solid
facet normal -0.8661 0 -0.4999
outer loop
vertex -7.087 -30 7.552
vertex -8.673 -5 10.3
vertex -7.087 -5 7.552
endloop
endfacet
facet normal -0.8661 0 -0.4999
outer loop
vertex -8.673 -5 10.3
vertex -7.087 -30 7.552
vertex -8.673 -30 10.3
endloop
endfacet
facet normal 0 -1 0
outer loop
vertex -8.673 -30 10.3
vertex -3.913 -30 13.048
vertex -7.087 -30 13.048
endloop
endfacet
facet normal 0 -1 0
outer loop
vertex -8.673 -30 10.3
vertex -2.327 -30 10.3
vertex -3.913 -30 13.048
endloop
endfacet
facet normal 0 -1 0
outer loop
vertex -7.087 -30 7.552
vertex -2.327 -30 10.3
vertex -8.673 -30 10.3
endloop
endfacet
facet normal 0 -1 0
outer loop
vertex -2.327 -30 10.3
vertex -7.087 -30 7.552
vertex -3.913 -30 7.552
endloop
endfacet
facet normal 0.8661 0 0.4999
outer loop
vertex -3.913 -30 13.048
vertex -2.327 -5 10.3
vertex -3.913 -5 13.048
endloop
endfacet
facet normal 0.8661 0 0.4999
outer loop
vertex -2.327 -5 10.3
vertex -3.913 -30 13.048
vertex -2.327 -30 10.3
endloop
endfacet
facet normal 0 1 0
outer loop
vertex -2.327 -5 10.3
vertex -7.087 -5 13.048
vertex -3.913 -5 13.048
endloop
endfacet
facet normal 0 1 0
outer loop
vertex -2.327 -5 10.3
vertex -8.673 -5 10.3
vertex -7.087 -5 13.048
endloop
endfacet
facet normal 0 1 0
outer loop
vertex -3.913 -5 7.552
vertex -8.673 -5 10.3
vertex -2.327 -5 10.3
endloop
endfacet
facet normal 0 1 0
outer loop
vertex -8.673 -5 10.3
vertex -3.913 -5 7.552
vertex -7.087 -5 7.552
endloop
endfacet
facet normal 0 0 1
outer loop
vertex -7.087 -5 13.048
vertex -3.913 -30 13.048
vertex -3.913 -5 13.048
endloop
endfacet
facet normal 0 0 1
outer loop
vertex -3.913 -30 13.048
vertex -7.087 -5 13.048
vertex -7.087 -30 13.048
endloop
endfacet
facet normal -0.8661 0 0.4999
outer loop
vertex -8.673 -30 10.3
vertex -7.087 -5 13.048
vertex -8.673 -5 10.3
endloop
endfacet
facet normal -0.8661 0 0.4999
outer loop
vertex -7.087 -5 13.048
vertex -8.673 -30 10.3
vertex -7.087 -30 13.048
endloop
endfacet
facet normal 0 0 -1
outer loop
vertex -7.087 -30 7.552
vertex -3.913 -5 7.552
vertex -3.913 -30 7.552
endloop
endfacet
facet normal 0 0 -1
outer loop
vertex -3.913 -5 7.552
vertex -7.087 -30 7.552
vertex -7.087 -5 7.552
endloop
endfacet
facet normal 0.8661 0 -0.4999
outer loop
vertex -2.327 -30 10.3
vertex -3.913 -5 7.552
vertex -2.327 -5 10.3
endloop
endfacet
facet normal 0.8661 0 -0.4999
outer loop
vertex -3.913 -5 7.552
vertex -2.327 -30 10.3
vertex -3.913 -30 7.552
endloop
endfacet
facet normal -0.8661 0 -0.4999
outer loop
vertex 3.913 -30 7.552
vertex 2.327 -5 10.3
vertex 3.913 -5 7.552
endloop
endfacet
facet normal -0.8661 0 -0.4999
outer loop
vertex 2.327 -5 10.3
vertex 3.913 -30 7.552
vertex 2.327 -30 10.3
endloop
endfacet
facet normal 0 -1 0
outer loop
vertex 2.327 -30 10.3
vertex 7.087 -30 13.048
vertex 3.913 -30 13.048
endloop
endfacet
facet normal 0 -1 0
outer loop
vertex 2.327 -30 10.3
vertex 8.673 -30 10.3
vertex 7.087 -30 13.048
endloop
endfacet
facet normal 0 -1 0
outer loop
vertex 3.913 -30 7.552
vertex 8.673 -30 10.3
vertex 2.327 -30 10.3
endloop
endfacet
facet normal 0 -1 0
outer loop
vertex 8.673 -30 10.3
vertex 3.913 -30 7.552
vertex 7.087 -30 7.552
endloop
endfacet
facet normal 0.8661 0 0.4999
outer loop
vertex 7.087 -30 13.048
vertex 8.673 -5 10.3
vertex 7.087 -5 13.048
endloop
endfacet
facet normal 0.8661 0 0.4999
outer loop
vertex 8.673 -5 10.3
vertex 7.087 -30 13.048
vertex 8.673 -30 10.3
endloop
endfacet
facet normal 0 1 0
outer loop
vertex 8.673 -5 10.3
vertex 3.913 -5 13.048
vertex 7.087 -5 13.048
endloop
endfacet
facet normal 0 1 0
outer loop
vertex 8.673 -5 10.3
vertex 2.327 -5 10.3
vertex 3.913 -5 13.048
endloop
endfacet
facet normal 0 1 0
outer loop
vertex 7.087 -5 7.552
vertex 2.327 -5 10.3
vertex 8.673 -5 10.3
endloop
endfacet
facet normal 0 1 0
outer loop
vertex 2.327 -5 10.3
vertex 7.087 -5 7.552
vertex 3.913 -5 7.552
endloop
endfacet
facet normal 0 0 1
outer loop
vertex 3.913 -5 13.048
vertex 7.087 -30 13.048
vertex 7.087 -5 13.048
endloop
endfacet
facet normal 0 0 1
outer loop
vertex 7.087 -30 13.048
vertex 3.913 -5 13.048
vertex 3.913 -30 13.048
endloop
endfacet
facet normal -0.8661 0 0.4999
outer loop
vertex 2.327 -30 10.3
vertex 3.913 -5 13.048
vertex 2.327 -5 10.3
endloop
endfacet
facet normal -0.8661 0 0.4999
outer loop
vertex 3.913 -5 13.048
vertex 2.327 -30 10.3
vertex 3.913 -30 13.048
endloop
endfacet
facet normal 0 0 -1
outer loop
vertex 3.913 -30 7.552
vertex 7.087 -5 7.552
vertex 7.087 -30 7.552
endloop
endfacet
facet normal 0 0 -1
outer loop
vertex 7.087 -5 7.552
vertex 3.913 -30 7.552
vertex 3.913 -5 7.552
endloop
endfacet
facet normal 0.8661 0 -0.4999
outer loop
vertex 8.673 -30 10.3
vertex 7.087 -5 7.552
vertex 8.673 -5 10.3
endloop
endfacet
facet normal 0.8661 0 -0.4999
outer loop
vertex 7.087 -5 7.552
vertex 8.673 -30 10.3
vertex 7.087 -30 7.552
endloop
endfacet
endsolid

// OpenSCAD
$fn = 50;

difference() {
	union() {
		translate(v = [-5.5, -30, 10.3]) {
			rotate(a = [-90, 0, 0]) {
				difference() {
					union() {
						linear_extrude(height = 25) {
							polygon(points = [[3.1734999999999998, 0.0], [1.5867500000000003, 2.7483316189099156], [-1.5867499999999992, 2.748331618909916], [-3.1734999999999998, 3.886416617094125e-16], [-1.5867500000000012, -2.748331618909915], [1.5867499999999977, -2.748331618909917]]);
						}
					}
					union();
				}
			}
		}
		translate(v = [5.5, -30, 10.3]) {
			rotate(a = [-90, 0, 0]) {
				difference() {
					union() {
						linear_extrude(height = 25) {
							polygon(points = [[3.1734999999999998, 0.0], [1.5867500000000003, 2.7483316189099156], [-1.5867499999999992, 2.748331618909916], [-3.1734999999999998, 3.886416617094125e-16], [-1.5867500000000012, -2.748331618909915], [1.5867499999999977, -2.748331618909917]]);
						}
					}
					union();
				}
			}
		}
	}
	union();
}
